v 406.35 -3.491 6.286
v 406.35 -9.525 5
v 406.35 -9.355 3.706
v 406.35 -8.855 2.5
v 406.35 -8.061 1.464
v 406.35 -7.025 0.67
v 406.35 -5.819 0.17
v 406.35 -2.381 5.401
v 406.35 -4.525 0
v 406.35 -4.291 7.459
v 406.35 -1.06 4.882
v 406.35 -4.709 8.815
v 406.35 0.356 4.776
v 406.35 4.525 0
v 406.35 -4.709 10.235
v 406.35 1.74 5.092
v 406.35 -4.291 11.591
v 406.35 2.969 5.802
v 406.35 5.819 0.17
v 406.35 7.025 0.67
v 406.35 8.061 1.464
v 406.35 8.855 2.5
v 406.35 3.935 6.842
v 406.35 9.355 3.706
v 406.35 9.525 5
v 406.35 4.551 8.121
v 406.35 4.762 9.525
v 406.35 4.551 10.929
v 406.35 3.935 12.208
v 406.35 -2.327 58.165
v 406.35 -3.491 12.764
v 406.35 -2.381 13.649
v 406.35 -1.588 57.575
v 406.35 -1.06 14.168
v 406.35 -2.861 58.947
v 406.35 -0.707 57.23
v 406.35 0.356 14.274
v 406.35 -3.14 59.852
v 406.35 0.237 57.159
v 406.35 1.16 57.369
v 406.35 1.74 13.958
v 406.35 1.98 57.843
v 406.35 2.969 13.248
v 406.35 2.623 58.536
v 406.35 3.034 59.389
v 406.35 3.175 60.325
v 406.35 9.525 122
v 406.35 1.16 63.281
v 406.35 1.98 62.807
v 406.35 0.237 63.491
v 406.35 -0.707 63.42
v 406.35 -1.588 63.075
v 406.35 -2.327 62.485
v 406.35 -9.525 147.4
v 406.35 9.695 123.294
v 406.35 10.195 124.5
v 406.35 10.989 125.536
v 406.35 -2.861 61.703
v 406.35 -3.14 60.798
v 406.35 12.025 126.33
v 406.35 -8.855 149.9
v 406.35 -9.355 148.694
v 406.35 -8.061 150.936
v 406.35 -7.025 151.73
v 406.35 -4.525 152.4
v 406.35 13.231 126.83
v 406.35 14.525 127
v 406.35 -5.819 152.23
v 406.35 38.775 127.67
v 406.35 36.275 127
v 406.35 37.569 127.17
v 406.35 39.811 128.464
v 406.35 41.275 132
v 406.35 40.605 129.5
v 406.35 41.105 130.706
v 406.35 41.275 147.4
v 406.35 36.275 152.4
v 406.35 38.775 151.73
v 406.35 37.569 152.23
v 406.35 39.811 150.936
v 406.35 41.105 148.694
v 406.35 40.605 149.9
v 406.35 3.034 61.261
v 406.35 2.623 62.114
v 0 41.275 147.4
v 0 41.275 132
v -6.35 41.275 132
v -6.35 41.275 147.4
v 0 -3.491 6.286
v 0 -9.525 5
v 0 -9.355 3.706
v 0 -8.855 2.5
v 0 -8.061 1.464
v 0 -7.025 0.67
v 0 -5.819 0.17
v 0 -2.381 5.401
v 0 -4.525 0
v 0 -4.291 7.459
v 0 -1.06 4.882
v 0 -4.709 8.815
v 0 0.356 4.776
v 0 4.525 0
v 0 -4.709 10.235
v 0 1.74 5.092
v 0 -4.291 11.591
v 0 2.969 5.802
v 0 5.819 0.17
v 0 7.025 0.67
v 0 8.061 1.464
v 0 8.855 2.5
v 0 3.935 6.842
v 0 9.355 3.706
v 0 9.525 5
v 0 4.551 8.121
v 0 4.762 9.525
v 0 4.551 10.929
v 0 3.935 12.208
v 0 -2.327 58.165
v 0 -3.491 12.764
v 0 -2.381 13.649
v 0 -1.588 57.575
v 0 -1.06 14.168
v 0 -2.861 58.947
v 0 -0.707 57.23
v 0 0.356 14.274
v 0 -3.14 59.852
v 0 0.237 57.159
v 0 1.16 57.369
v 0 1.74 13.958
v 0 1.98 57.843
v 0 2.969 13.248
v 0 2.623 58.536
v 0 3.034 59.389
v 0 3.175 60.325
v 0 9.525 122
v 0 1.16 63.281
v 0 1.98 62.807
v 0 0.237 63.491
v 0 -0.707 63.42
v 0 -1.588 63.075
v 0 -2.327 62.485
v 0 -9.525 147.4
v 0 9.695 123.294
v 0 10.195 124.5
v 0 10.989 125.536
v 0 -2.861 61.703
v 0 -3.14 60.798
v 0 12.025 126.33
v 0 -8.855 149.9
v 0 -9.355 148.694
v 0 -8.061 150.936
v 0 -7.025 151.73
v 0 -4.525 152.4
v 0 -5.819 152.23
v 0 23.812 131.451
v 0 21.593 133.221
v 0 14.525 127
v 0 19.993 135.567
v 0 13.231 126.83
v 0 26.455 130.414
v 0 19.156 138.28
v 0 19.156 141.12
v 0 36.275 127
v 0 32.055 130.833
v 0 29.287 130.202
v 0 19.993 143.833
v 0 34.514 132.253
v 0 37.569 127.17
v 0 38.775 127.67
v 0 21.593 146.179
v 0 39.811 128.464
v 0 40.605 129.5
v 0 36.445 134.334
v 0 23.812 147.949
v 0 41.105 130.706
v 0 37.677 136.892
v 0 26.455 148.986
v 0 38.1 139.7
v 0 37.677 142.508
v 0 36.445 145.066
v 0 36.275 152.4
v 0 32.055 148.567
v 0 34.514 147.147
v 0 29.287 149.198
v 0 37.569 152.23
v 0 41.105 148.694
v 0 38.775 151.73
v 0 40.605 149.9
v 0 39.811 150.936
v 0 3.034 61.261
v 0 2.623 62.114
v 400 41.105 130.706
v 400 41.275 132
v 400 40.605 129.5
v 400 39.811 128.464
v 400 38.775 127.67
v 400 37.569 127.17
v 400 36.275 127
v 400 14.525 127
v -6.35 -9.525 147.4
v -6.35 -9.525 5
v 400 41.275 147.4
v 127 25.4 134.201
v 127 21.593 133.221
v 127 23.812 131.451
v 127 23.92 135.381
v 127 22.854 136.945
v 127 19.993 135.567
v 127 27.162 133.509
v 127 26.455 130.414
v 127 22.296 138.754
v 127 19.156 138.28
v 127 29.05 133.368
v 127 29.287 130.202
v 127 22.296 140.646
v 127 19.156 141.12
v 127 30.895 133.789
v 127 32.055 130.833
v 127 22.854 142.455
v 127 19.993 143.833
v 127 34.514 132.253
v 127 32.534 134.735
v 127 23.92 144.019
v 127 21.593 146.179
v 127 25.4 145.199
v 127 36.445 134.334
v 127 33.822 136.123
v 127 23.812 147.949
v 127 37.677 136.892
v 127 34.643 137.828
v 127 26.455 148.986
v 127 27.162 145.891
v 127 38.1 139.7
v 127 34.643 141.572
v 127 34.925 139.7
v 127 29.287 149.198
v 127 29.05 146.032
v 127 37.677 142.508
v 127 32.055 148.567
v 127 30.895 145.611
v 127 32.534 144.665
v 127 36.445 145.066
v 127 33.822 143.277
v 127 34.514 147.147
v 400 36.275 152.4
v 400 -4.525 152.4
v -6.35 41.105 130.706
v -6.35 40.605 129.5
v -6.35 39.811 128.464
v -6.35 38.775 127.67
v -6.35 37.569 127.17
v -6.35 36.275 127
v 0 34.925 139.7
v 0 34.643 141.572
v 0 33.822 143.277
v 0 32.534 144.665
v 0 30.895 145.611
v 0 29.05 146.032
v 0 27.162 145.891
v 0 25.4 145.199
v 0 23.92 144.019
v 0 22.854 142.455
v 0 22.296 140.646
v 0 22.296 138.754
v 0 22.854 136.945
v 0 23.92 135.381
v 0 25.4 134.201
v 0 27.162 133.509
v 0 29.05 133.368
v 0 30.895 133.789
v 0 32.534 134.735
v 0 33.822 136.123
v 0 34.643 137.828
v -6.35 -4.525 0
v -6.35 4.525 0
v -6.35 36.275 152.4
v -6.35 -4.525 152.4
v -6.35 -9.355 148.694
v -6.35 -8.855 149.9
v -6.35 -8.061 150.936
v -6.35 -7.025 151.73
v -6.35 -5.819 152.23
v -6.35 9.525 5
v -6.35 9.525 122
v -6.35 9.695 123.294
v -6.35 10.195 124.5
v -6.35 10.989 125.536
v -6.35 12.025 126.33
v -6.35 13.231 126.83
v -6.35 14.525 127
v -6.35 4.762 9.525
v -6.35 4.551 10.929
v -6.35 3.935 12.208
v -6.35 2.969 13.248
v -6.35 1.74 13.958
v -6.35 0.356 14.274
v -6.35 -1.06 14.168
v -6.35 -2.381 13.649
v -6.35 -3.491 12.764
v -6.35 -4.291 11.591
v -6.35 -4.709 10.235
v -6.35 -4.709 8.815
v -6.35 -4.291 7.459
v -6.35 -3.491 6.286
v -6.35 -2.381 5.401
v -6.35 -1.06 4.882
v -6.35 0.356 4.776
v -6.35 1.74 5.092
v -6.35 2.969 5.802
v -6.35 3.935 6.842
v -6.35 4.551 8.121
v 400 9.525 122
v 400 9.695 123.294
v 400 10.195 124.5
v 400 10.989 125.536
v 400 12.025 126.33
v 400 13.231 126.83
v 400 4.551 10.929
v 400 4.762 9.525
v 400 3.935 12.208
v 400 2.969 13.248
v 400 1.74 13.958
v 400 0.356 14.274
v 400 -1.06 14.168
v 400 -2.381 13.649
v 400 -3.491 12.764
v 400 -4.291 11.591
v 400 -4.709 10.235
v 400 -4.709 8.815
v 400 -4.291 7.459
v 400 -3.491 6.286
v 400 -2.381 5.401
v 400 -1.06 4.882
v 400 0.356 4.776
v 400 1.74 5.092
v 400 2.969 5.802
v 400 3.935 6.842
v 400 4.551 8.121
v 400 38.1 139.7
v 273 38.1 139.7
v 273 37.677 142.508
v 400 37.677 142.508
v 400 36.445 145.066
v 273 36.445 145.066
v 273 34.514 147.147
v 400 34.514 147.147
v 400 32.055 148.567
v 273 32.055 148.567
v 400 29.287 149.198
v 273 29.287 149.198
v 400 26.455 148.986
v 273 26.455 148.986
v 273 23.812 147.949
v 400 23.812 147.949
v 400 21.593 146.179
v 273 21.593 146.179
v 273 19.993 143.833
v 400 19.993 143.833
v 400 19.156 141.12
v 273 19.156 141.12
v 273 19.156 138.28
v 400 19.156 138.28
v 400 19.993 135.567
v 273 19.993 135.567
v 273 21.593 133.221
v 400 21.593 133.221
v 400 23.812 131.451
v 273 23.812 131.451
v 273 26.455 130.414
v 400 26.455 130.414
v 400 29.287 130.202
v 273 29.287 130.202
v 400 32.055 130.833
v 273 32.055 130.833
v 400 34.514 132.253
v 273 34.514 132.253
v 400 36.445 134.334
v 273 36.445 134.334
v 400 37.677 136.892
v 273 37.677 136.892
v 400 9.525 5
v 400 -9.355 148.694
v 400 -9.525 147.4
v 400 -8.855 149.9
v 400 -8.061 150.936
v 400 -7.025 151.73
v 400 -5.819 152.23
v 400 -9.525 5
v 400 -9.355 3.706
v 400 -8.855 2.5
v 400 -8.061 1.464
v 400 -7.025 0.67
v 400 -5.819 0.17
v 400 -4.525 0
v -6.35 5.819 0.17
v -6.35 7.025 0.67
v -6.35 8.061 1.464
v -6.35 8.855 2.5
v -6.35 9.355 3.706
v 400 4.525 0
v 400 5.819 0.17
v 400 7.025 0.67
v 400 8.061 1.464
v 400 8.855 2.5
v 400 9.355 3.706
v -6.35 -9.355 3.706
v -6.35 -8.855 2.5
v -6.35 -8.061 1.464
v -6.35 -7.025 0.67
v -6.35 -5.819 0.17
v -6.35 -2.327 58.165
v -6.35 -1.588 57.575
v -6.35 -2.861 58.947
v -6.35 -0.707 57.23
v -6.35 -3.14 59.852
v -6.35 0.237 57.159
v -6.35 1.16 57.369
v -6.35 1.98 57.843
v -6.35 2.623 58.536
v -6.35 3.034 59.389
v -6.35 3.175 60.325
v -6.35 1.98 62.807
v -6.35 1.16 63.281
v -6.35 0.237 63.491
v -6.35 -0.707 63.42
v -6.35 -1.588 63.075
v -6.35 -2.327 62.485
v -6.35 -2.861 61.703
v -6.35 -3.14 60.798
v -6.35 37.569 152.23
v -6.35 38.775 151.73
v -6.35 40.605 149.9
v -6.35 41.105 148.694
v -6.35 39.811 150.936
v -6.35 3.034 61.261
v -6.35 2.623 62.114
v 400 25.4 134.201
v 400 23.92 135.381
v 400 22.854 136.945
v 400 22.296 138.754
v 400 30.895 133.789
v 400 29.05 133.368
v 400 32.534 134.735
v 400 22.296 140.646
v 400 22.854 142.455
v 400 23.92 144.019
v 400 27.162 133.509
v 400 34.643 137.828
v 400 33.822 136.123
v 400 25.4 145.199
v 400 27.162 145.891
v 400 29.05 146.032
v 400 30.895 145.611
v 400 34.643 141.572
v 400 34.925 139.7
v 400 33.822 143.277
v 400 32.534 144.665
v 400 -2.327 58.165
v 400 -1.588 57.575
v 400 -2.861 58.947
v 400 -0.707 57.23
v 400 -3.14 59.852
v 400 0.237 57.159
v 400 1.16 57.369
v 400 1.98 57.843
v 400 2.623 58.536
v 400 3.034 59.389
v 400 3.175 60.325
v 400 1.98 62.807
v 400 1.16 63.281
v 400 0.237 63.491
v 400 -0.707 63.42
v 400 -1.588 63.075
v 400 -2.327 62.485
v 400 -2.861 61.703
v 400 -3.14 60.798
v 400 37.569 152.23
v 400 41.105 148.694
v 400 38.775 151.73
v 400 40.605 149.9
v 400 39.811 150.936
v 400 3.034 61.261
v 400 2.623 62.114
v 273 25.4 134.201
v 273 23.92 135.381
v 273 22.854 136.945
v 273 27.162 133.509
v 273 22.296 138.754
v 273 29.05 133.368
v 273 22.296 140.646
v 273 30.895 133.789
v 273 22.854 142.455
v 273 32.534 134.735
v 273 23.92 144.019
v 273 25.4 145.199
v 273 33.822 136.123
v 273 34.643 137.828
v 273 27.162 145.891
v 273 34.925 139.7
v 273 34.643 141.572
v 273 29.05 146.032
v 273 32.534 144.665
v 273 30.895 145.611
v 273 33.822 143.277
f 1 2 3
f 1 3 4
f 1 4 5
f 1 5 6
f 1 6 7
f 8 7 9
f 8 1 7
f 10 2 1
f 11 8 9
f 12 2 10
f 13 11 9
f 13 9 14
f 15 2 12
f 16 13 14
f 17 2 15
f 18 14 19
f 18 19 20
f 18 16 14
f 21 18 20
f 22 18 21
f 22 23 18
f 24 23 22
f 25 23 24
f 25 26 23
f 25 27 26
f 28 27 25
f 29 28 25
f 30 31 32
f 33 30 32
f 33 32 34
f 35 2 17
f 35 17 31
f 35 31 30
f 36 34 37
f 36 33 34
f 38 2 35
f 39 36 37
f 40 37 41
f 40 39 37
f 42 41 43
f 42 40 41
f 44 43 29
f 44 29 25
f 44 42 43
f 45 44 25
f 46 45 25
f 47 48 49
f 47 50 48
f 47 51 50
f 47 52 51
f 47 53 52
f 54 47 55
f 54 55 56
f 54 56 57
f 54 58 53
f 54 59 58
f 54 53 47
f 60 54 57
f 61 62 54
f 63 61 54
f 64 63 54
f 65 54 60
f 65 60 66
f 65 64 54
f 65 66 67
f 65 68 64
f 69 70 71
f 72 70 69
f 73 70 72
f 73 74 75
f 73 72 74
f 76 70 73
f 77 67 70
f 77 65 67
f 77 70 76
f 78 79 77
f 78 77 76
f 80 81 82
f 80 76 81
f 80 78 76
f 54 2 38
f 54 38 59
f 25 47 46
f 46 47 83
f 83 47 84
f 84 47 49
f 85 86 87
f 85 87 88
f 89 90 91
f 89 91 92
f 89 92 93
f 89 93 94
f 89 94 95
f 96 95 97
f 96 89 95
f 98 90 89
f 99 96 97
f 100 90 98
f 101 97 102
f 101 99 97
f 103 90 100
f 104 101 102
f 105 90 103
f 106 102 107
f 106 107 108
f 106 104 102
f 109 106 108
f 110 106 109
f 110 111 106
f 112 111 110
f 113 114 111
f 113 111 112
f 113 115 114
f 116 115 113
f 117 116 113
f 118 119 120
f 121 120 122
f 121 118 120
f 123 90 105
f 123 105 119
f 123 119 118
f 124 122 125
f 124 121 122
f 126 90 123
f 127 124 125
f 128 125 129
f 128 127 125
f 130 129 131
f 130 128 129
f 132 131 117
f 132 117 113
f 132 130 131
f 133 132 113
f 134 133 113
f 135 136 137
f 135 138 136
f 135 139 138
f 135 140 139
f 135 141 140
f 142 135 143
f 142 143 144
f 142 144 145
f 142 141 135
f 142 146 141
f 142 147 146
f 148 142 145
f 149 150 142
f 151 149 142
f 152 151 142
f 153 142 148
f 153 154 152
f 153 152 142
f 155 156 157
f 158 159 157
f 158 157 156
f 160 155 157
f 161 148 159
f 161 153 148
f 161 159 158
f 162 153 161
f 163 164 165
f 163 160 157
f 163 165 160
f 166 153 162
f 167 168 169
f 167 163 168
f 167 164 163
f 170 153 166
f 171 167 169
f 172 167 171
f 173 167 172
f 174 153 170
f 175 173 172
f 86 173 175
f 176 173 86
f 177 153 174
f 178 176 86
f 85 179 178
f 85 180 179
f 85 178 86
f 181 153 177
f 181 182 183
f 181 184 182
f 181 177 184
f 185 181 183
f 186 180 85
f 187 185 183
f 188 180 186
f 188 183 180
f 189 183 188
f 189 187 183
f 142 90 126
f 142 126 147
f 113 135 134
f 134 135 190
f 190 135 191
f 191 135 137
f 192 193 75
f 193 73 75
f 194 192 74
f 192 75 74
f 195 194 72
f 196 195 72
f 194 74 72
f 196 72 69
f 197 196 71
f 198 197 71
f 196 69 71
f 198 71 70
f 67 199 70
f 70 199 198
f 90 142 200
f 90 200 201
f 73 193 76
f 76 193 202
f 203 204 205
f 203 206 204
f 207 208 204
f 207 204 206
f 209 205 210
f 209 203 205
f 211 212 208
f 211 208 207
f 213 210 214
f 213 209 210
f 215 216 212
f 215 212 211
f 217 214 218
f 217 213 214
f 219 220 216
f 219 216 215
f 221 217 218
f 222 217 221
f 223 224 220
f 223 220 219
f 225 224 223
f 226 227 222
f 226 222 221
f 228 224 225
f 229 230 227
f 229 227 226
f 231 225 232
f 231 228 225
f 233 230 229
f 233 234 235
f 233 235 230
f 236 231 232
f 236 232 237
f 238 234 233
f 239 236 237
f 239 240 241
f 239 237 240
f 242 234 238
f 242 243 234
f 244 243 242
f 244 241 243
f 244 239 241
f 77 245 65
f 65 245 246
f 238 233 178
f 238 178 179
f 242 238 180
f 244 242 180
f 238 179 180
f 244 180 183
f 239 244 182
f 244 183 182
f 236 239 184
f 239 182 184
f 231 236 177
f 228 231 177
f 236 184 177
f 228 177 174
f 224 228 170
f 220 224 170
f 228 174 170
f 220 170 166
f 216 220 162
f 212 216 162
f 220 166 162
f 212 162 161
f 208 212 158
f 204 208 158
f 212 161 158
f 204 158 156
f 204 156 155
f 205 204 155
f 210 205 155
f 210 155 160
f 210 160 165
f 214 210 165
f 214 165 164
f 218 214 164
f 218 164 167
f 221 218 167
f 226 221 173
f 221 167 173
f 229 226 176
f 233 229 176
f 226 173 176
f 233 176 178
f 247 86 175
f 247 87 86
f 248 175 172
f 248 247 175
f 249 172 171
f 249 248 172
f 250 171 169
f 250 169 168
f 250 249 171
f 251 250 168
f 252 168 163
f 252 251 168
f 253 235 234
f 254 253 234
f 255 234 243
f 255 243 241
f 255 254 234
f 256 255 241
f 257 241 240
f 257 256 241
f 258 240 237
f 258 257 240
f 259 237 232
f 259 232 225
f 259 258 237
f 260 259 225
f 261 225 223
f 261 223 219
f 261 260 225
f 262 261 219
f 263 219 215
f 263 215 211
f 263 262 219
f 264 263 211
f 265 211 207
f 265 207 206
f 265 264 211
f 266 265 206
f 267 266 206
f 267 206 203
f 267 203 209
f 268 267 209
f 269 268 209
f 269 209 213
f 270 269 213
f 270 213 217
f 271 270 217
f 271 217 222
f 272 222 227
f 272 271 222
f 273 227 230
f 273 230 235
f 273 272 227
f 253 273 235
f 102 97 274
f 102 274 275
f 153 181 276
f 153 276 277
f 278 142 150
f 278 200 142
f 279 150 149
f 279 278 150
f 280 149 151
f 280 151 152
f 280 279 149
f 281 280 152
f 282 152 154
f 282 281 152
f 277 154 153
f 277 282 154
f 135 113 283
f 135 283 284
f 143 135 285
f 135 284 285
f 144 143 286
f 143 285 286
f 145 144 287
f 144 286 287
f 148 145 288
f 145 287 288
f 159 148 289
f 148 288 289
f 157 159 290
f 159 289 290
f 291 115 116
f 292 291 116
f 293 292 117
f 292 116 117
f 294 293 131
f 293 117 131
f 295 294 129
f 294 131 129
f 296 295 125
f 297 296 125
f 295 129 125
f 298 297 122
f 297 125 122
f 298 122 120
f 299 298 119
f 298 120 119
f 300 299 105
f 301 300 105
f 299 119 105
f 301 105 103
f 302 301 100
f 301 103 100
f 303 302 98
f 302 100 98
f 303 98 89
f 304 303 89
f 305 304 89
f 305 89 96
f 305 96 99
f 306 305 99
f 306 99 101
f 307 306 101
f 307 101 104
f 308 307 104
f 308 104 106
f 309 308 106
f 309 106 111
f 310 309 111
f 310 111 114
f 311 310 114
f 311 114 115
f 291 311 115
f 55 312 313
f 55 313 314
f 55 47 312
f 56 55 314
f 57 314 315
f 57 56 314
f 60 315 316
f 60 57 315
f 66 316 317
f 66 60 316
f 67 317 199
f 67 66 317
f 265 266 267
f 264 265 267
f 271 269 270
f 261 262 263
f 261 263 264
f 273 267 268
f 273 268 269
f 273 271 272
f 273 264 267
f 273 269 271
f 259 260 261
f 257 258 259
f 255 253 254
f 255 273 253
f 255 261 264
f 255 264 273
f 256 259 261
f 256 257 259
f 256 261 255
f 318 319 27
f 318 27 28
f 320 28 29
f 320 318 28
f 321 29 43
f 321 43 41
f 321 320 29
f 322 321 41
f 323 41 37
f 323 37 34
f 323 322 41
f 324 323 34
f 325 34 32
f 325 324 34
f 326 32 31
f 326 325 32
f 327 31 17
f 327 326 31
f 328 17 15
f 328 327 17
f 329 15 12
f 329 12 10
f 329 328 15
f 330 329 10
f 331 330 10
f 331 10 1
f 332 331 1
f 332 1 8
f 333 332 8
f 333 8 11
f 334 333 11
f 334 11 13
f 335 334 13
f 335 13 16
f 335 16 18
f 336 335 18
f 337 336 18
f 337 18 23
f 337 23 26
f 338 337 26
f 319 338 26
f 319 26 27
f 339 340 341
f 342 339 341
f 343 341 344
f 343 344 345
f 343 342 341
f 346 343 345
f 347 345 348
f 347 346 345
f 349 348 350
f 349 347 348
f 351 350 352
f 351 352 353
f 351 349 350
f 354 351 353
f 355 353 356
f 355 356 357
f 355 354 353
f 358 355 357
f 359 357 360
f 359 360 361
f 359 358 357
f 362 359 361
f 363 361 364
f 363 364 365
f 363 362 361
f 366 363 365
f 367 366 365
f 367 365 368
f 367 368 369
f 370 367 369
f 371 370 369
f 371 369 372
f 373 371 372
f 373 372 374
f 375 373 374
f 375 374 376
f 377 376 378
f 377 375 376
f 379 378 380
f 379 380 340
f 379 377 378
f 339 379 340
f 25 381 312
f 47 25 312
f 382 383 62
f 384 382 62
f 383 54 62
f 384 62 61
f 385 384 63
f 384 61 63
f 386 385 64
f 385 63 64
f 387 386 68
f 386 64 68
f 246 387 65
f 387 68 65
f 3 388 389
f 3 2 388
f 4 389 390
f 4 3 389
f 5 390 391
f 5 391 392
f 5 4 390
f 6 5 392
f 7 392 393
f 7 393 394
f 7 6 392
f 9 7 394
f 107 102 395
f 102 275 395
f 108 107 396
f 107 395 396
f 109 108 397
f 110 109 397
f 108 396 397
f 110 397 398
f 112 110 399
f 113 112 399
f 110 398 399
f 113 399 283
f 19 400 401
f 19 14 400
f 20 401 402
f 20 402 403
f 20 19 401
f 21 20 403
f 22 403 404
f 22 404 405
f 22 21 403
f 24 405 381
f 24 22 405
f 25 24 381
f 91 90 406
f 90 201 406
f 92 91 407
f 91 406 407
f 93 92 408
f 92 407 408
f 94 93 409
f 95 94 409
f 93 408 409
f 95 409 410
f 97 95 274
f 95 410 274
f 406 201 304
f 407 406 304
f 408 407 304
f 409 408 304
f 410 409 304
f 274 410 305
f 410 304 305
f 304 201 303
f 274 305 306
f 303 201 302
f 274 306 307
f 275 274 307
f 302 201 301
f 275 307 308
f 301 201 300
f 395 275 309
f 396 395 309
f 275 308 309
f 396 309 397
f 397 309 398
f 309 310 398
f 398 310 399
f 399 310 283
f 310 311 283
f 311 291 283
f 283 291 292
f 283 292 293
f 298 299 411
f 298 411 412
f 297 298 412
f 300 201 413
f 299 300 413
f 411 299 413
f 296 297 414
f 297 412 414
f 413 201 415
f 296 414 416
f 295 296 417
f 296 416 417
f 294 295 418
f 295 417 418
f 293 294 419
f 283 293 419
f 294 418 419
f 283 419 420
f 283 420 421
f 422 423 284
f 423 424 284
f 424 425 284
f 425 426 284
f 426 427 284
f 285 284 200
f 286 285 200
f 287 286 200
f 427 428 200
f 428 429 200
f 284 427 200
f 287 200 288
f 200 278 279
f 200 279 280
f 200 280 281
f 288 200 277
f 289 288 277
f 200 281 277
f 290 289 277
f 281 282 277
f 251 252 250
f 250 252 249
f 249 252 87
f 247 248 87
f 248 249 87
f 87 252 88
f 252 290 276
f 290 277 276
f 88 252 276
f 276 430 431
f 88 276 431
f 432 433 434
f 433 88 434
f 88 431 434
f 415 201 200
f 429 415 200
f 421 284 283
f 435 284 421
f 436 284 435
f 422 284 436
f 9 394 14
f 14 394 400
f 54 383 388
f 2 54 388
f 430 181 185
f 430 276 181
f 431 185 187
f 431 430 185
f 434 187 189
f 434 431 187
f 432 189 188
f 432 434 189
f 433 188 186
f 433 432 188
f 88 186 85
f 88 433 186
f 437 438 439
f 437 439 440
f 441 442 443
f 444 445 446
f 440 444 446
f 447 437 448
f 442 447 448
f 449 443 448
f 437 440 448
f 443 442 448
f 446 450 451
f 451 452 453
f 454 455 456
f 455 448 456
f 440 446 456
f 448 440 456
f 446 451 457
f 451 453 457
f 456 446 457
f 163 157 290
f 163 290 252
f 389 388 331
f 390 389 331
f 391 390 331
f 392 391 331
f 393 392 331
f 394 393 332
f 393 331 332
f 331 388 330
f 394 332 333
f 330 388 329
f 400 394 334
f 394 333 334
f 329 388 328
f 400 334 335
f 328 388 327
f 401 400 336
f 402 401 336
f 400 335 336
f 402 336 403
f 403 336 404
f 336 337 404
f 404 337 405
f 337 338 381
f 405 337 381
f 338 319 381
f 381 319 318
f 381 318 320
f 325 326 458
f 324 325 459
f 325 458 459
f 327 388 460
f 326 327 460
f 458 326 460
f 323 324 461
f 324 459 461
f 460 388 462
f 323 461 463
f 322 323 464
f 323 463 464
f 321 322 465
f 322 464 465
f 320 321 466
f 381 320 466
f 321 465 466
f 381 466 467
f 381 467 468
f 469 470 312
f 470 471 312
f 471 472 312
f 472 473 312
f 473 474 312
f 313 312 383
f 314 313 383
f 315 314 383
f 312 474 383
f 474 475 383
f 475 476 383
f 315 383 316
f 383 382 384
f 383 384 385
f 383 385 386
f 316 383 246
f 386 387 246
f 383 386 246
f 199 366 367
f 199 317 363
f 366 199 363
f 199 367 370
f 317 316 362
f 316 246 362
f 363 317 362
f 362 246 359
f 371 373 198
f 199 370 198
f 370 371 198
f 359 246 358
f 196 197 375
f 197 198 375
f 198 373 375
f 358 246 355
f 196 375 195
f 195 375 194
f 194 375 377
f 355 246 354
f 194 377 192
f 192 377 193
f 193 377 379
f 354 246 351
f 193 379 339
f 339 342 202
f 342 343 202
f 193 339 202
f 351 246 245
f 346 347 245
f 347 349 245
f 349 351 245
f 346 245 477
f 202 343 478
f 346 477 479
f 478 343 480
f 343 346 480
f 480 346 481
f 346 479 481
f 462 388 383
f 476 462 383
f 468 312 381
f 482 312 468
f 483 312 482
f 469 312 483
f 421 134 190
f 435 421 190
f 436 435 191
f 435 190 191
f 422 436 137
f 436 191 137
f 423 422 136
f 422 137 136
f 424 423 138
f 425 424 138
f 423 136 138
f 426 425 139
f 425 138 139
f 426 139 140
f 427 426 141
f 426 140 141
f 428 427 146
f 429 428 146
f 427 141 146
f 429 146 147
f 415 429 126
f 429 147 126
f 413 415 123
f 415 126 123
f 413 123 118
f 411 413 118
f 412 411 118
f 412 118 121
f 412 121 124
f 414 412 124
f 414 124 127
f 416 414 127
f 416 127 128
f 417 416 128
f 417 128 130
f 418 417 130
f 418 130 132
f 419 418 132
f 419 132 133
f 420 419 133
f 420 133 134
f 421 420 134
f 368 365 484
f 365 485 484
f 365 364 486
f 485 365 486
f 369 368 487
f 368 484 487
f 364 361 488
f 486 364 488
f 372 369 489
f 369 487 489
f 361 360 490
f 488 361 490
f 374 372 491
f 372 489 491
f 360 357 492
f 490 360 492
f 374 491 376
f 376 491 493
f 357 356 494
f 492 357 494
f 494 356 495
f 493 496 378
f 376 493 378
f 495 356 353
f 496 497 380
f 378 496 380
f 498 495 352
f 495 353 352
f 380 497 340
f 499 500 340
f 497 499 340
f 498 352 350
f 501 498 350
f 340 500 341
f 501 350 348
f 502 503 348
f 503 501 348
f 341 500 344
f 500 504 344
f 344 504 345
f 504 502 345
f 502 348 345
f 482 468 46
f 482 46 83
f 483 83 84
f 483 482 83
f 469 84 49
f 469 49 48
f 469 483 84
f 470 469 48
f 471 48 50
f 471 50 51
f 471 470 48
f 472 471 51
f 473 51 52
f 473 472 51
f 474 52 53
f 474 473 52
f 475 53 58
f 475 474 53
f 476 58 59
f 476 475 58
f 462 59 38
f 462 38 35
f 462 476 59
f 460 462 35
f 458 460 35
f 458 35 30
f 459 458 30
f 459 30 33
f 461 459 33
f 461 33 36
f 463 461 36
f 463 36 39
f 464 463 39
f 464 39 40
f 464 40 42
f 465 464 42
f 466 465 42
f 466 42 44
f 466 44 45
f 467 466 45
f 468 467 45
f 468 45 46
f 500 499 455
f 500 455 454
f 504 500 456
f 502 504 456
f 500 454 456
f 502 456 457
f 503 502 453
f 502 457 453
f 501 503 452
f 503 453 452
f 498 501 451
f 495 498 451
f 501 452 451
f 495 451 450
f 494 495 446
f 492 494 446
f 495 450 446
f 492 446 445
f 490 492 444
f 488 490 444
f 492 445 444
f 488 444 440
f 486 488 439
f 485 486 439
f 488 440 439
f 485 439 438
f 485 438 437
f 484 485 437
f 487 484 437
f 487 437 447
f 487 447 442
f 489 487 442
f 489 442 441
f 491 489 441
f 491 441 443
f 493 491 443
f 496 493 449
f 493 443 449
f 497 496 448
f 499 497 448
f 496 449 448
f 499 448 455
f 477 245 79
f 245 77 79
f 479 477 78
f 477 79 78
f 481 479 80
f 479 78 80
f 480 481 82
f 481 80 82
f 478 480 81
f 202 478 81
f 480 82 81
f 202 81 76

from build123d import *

# Parameters (mm, degrees)
F0_W     = 31.75
F0_H     = 25.4
F1_DEPTH = 6.35
F2_R     = 9.525
F2_R_2   = 6.35
F3_DEPTH = 127
F4_R     = 5
F5_R     = 4.7625
F5_R_2   = 3.175
F6_DEPTH = 6.351


# Not quite as in the source:
# - a length typed as a fraction of an inch, garbled in the dataset ("3 / 203.2 mm" for 3/8 in), is restored


with BuildPart() as f1:
    # F0 (on Right) → F1 (new body)
    with BuildSketch(Plane.YZ):
        Polygon((-9.525, 152.4), (-9.525, 0), (9.525, 0), (9.525, 127), (9.525, 152.4), align=None)
        with Locations((25.4, 139.7)):
            Rectangle(F0_W, F0_H)
    extrude(amount=-F1_DEPTH)

    # F2 (on face) → F3 (join)
    with BuildSketch(Plane.YZ):
        with Locations((28.575, 139.7)):
            Circle(F2_R)
        with Locations((28.575, 139.7)):
            Circle(F2_R_2, mode=Mode.SUBTRACT)
    extrude(amount=F3_DEPTH)

    # F4
    f4_edges = [f1.edges().sort_by_distance(p)[0] for p in [
        (-3.175, -9.525, 152.4),
        (-3.175, 9.525, 127),
        (-3.175, 41.275, 127),
        (-3.175, 41.275, 152.4),
        (-3.175, 9.525, 0),
        (-3.175, -9.525, 0),
    ]]
    fillet(f4_edges, radius=F4_R)

    # F5 (on face) → F6 (cut, through all)
    with BuildSketch(Plane.YZ):
        with Locations((0, 9.525)):
            Circle(F5_R)
        with Locations((0, 60.325)):
            Circle(F5_R_2)
    extrude(amount=-F6_DEPTH, mode=Mode.SUBTRACT)


with BuildPart() as f8_1:
    # F8: instance of F1
    add(f1.part.mirror(Plane.YZ.offset(200)))


solid = Compound([f1.part, f8_1.part])
